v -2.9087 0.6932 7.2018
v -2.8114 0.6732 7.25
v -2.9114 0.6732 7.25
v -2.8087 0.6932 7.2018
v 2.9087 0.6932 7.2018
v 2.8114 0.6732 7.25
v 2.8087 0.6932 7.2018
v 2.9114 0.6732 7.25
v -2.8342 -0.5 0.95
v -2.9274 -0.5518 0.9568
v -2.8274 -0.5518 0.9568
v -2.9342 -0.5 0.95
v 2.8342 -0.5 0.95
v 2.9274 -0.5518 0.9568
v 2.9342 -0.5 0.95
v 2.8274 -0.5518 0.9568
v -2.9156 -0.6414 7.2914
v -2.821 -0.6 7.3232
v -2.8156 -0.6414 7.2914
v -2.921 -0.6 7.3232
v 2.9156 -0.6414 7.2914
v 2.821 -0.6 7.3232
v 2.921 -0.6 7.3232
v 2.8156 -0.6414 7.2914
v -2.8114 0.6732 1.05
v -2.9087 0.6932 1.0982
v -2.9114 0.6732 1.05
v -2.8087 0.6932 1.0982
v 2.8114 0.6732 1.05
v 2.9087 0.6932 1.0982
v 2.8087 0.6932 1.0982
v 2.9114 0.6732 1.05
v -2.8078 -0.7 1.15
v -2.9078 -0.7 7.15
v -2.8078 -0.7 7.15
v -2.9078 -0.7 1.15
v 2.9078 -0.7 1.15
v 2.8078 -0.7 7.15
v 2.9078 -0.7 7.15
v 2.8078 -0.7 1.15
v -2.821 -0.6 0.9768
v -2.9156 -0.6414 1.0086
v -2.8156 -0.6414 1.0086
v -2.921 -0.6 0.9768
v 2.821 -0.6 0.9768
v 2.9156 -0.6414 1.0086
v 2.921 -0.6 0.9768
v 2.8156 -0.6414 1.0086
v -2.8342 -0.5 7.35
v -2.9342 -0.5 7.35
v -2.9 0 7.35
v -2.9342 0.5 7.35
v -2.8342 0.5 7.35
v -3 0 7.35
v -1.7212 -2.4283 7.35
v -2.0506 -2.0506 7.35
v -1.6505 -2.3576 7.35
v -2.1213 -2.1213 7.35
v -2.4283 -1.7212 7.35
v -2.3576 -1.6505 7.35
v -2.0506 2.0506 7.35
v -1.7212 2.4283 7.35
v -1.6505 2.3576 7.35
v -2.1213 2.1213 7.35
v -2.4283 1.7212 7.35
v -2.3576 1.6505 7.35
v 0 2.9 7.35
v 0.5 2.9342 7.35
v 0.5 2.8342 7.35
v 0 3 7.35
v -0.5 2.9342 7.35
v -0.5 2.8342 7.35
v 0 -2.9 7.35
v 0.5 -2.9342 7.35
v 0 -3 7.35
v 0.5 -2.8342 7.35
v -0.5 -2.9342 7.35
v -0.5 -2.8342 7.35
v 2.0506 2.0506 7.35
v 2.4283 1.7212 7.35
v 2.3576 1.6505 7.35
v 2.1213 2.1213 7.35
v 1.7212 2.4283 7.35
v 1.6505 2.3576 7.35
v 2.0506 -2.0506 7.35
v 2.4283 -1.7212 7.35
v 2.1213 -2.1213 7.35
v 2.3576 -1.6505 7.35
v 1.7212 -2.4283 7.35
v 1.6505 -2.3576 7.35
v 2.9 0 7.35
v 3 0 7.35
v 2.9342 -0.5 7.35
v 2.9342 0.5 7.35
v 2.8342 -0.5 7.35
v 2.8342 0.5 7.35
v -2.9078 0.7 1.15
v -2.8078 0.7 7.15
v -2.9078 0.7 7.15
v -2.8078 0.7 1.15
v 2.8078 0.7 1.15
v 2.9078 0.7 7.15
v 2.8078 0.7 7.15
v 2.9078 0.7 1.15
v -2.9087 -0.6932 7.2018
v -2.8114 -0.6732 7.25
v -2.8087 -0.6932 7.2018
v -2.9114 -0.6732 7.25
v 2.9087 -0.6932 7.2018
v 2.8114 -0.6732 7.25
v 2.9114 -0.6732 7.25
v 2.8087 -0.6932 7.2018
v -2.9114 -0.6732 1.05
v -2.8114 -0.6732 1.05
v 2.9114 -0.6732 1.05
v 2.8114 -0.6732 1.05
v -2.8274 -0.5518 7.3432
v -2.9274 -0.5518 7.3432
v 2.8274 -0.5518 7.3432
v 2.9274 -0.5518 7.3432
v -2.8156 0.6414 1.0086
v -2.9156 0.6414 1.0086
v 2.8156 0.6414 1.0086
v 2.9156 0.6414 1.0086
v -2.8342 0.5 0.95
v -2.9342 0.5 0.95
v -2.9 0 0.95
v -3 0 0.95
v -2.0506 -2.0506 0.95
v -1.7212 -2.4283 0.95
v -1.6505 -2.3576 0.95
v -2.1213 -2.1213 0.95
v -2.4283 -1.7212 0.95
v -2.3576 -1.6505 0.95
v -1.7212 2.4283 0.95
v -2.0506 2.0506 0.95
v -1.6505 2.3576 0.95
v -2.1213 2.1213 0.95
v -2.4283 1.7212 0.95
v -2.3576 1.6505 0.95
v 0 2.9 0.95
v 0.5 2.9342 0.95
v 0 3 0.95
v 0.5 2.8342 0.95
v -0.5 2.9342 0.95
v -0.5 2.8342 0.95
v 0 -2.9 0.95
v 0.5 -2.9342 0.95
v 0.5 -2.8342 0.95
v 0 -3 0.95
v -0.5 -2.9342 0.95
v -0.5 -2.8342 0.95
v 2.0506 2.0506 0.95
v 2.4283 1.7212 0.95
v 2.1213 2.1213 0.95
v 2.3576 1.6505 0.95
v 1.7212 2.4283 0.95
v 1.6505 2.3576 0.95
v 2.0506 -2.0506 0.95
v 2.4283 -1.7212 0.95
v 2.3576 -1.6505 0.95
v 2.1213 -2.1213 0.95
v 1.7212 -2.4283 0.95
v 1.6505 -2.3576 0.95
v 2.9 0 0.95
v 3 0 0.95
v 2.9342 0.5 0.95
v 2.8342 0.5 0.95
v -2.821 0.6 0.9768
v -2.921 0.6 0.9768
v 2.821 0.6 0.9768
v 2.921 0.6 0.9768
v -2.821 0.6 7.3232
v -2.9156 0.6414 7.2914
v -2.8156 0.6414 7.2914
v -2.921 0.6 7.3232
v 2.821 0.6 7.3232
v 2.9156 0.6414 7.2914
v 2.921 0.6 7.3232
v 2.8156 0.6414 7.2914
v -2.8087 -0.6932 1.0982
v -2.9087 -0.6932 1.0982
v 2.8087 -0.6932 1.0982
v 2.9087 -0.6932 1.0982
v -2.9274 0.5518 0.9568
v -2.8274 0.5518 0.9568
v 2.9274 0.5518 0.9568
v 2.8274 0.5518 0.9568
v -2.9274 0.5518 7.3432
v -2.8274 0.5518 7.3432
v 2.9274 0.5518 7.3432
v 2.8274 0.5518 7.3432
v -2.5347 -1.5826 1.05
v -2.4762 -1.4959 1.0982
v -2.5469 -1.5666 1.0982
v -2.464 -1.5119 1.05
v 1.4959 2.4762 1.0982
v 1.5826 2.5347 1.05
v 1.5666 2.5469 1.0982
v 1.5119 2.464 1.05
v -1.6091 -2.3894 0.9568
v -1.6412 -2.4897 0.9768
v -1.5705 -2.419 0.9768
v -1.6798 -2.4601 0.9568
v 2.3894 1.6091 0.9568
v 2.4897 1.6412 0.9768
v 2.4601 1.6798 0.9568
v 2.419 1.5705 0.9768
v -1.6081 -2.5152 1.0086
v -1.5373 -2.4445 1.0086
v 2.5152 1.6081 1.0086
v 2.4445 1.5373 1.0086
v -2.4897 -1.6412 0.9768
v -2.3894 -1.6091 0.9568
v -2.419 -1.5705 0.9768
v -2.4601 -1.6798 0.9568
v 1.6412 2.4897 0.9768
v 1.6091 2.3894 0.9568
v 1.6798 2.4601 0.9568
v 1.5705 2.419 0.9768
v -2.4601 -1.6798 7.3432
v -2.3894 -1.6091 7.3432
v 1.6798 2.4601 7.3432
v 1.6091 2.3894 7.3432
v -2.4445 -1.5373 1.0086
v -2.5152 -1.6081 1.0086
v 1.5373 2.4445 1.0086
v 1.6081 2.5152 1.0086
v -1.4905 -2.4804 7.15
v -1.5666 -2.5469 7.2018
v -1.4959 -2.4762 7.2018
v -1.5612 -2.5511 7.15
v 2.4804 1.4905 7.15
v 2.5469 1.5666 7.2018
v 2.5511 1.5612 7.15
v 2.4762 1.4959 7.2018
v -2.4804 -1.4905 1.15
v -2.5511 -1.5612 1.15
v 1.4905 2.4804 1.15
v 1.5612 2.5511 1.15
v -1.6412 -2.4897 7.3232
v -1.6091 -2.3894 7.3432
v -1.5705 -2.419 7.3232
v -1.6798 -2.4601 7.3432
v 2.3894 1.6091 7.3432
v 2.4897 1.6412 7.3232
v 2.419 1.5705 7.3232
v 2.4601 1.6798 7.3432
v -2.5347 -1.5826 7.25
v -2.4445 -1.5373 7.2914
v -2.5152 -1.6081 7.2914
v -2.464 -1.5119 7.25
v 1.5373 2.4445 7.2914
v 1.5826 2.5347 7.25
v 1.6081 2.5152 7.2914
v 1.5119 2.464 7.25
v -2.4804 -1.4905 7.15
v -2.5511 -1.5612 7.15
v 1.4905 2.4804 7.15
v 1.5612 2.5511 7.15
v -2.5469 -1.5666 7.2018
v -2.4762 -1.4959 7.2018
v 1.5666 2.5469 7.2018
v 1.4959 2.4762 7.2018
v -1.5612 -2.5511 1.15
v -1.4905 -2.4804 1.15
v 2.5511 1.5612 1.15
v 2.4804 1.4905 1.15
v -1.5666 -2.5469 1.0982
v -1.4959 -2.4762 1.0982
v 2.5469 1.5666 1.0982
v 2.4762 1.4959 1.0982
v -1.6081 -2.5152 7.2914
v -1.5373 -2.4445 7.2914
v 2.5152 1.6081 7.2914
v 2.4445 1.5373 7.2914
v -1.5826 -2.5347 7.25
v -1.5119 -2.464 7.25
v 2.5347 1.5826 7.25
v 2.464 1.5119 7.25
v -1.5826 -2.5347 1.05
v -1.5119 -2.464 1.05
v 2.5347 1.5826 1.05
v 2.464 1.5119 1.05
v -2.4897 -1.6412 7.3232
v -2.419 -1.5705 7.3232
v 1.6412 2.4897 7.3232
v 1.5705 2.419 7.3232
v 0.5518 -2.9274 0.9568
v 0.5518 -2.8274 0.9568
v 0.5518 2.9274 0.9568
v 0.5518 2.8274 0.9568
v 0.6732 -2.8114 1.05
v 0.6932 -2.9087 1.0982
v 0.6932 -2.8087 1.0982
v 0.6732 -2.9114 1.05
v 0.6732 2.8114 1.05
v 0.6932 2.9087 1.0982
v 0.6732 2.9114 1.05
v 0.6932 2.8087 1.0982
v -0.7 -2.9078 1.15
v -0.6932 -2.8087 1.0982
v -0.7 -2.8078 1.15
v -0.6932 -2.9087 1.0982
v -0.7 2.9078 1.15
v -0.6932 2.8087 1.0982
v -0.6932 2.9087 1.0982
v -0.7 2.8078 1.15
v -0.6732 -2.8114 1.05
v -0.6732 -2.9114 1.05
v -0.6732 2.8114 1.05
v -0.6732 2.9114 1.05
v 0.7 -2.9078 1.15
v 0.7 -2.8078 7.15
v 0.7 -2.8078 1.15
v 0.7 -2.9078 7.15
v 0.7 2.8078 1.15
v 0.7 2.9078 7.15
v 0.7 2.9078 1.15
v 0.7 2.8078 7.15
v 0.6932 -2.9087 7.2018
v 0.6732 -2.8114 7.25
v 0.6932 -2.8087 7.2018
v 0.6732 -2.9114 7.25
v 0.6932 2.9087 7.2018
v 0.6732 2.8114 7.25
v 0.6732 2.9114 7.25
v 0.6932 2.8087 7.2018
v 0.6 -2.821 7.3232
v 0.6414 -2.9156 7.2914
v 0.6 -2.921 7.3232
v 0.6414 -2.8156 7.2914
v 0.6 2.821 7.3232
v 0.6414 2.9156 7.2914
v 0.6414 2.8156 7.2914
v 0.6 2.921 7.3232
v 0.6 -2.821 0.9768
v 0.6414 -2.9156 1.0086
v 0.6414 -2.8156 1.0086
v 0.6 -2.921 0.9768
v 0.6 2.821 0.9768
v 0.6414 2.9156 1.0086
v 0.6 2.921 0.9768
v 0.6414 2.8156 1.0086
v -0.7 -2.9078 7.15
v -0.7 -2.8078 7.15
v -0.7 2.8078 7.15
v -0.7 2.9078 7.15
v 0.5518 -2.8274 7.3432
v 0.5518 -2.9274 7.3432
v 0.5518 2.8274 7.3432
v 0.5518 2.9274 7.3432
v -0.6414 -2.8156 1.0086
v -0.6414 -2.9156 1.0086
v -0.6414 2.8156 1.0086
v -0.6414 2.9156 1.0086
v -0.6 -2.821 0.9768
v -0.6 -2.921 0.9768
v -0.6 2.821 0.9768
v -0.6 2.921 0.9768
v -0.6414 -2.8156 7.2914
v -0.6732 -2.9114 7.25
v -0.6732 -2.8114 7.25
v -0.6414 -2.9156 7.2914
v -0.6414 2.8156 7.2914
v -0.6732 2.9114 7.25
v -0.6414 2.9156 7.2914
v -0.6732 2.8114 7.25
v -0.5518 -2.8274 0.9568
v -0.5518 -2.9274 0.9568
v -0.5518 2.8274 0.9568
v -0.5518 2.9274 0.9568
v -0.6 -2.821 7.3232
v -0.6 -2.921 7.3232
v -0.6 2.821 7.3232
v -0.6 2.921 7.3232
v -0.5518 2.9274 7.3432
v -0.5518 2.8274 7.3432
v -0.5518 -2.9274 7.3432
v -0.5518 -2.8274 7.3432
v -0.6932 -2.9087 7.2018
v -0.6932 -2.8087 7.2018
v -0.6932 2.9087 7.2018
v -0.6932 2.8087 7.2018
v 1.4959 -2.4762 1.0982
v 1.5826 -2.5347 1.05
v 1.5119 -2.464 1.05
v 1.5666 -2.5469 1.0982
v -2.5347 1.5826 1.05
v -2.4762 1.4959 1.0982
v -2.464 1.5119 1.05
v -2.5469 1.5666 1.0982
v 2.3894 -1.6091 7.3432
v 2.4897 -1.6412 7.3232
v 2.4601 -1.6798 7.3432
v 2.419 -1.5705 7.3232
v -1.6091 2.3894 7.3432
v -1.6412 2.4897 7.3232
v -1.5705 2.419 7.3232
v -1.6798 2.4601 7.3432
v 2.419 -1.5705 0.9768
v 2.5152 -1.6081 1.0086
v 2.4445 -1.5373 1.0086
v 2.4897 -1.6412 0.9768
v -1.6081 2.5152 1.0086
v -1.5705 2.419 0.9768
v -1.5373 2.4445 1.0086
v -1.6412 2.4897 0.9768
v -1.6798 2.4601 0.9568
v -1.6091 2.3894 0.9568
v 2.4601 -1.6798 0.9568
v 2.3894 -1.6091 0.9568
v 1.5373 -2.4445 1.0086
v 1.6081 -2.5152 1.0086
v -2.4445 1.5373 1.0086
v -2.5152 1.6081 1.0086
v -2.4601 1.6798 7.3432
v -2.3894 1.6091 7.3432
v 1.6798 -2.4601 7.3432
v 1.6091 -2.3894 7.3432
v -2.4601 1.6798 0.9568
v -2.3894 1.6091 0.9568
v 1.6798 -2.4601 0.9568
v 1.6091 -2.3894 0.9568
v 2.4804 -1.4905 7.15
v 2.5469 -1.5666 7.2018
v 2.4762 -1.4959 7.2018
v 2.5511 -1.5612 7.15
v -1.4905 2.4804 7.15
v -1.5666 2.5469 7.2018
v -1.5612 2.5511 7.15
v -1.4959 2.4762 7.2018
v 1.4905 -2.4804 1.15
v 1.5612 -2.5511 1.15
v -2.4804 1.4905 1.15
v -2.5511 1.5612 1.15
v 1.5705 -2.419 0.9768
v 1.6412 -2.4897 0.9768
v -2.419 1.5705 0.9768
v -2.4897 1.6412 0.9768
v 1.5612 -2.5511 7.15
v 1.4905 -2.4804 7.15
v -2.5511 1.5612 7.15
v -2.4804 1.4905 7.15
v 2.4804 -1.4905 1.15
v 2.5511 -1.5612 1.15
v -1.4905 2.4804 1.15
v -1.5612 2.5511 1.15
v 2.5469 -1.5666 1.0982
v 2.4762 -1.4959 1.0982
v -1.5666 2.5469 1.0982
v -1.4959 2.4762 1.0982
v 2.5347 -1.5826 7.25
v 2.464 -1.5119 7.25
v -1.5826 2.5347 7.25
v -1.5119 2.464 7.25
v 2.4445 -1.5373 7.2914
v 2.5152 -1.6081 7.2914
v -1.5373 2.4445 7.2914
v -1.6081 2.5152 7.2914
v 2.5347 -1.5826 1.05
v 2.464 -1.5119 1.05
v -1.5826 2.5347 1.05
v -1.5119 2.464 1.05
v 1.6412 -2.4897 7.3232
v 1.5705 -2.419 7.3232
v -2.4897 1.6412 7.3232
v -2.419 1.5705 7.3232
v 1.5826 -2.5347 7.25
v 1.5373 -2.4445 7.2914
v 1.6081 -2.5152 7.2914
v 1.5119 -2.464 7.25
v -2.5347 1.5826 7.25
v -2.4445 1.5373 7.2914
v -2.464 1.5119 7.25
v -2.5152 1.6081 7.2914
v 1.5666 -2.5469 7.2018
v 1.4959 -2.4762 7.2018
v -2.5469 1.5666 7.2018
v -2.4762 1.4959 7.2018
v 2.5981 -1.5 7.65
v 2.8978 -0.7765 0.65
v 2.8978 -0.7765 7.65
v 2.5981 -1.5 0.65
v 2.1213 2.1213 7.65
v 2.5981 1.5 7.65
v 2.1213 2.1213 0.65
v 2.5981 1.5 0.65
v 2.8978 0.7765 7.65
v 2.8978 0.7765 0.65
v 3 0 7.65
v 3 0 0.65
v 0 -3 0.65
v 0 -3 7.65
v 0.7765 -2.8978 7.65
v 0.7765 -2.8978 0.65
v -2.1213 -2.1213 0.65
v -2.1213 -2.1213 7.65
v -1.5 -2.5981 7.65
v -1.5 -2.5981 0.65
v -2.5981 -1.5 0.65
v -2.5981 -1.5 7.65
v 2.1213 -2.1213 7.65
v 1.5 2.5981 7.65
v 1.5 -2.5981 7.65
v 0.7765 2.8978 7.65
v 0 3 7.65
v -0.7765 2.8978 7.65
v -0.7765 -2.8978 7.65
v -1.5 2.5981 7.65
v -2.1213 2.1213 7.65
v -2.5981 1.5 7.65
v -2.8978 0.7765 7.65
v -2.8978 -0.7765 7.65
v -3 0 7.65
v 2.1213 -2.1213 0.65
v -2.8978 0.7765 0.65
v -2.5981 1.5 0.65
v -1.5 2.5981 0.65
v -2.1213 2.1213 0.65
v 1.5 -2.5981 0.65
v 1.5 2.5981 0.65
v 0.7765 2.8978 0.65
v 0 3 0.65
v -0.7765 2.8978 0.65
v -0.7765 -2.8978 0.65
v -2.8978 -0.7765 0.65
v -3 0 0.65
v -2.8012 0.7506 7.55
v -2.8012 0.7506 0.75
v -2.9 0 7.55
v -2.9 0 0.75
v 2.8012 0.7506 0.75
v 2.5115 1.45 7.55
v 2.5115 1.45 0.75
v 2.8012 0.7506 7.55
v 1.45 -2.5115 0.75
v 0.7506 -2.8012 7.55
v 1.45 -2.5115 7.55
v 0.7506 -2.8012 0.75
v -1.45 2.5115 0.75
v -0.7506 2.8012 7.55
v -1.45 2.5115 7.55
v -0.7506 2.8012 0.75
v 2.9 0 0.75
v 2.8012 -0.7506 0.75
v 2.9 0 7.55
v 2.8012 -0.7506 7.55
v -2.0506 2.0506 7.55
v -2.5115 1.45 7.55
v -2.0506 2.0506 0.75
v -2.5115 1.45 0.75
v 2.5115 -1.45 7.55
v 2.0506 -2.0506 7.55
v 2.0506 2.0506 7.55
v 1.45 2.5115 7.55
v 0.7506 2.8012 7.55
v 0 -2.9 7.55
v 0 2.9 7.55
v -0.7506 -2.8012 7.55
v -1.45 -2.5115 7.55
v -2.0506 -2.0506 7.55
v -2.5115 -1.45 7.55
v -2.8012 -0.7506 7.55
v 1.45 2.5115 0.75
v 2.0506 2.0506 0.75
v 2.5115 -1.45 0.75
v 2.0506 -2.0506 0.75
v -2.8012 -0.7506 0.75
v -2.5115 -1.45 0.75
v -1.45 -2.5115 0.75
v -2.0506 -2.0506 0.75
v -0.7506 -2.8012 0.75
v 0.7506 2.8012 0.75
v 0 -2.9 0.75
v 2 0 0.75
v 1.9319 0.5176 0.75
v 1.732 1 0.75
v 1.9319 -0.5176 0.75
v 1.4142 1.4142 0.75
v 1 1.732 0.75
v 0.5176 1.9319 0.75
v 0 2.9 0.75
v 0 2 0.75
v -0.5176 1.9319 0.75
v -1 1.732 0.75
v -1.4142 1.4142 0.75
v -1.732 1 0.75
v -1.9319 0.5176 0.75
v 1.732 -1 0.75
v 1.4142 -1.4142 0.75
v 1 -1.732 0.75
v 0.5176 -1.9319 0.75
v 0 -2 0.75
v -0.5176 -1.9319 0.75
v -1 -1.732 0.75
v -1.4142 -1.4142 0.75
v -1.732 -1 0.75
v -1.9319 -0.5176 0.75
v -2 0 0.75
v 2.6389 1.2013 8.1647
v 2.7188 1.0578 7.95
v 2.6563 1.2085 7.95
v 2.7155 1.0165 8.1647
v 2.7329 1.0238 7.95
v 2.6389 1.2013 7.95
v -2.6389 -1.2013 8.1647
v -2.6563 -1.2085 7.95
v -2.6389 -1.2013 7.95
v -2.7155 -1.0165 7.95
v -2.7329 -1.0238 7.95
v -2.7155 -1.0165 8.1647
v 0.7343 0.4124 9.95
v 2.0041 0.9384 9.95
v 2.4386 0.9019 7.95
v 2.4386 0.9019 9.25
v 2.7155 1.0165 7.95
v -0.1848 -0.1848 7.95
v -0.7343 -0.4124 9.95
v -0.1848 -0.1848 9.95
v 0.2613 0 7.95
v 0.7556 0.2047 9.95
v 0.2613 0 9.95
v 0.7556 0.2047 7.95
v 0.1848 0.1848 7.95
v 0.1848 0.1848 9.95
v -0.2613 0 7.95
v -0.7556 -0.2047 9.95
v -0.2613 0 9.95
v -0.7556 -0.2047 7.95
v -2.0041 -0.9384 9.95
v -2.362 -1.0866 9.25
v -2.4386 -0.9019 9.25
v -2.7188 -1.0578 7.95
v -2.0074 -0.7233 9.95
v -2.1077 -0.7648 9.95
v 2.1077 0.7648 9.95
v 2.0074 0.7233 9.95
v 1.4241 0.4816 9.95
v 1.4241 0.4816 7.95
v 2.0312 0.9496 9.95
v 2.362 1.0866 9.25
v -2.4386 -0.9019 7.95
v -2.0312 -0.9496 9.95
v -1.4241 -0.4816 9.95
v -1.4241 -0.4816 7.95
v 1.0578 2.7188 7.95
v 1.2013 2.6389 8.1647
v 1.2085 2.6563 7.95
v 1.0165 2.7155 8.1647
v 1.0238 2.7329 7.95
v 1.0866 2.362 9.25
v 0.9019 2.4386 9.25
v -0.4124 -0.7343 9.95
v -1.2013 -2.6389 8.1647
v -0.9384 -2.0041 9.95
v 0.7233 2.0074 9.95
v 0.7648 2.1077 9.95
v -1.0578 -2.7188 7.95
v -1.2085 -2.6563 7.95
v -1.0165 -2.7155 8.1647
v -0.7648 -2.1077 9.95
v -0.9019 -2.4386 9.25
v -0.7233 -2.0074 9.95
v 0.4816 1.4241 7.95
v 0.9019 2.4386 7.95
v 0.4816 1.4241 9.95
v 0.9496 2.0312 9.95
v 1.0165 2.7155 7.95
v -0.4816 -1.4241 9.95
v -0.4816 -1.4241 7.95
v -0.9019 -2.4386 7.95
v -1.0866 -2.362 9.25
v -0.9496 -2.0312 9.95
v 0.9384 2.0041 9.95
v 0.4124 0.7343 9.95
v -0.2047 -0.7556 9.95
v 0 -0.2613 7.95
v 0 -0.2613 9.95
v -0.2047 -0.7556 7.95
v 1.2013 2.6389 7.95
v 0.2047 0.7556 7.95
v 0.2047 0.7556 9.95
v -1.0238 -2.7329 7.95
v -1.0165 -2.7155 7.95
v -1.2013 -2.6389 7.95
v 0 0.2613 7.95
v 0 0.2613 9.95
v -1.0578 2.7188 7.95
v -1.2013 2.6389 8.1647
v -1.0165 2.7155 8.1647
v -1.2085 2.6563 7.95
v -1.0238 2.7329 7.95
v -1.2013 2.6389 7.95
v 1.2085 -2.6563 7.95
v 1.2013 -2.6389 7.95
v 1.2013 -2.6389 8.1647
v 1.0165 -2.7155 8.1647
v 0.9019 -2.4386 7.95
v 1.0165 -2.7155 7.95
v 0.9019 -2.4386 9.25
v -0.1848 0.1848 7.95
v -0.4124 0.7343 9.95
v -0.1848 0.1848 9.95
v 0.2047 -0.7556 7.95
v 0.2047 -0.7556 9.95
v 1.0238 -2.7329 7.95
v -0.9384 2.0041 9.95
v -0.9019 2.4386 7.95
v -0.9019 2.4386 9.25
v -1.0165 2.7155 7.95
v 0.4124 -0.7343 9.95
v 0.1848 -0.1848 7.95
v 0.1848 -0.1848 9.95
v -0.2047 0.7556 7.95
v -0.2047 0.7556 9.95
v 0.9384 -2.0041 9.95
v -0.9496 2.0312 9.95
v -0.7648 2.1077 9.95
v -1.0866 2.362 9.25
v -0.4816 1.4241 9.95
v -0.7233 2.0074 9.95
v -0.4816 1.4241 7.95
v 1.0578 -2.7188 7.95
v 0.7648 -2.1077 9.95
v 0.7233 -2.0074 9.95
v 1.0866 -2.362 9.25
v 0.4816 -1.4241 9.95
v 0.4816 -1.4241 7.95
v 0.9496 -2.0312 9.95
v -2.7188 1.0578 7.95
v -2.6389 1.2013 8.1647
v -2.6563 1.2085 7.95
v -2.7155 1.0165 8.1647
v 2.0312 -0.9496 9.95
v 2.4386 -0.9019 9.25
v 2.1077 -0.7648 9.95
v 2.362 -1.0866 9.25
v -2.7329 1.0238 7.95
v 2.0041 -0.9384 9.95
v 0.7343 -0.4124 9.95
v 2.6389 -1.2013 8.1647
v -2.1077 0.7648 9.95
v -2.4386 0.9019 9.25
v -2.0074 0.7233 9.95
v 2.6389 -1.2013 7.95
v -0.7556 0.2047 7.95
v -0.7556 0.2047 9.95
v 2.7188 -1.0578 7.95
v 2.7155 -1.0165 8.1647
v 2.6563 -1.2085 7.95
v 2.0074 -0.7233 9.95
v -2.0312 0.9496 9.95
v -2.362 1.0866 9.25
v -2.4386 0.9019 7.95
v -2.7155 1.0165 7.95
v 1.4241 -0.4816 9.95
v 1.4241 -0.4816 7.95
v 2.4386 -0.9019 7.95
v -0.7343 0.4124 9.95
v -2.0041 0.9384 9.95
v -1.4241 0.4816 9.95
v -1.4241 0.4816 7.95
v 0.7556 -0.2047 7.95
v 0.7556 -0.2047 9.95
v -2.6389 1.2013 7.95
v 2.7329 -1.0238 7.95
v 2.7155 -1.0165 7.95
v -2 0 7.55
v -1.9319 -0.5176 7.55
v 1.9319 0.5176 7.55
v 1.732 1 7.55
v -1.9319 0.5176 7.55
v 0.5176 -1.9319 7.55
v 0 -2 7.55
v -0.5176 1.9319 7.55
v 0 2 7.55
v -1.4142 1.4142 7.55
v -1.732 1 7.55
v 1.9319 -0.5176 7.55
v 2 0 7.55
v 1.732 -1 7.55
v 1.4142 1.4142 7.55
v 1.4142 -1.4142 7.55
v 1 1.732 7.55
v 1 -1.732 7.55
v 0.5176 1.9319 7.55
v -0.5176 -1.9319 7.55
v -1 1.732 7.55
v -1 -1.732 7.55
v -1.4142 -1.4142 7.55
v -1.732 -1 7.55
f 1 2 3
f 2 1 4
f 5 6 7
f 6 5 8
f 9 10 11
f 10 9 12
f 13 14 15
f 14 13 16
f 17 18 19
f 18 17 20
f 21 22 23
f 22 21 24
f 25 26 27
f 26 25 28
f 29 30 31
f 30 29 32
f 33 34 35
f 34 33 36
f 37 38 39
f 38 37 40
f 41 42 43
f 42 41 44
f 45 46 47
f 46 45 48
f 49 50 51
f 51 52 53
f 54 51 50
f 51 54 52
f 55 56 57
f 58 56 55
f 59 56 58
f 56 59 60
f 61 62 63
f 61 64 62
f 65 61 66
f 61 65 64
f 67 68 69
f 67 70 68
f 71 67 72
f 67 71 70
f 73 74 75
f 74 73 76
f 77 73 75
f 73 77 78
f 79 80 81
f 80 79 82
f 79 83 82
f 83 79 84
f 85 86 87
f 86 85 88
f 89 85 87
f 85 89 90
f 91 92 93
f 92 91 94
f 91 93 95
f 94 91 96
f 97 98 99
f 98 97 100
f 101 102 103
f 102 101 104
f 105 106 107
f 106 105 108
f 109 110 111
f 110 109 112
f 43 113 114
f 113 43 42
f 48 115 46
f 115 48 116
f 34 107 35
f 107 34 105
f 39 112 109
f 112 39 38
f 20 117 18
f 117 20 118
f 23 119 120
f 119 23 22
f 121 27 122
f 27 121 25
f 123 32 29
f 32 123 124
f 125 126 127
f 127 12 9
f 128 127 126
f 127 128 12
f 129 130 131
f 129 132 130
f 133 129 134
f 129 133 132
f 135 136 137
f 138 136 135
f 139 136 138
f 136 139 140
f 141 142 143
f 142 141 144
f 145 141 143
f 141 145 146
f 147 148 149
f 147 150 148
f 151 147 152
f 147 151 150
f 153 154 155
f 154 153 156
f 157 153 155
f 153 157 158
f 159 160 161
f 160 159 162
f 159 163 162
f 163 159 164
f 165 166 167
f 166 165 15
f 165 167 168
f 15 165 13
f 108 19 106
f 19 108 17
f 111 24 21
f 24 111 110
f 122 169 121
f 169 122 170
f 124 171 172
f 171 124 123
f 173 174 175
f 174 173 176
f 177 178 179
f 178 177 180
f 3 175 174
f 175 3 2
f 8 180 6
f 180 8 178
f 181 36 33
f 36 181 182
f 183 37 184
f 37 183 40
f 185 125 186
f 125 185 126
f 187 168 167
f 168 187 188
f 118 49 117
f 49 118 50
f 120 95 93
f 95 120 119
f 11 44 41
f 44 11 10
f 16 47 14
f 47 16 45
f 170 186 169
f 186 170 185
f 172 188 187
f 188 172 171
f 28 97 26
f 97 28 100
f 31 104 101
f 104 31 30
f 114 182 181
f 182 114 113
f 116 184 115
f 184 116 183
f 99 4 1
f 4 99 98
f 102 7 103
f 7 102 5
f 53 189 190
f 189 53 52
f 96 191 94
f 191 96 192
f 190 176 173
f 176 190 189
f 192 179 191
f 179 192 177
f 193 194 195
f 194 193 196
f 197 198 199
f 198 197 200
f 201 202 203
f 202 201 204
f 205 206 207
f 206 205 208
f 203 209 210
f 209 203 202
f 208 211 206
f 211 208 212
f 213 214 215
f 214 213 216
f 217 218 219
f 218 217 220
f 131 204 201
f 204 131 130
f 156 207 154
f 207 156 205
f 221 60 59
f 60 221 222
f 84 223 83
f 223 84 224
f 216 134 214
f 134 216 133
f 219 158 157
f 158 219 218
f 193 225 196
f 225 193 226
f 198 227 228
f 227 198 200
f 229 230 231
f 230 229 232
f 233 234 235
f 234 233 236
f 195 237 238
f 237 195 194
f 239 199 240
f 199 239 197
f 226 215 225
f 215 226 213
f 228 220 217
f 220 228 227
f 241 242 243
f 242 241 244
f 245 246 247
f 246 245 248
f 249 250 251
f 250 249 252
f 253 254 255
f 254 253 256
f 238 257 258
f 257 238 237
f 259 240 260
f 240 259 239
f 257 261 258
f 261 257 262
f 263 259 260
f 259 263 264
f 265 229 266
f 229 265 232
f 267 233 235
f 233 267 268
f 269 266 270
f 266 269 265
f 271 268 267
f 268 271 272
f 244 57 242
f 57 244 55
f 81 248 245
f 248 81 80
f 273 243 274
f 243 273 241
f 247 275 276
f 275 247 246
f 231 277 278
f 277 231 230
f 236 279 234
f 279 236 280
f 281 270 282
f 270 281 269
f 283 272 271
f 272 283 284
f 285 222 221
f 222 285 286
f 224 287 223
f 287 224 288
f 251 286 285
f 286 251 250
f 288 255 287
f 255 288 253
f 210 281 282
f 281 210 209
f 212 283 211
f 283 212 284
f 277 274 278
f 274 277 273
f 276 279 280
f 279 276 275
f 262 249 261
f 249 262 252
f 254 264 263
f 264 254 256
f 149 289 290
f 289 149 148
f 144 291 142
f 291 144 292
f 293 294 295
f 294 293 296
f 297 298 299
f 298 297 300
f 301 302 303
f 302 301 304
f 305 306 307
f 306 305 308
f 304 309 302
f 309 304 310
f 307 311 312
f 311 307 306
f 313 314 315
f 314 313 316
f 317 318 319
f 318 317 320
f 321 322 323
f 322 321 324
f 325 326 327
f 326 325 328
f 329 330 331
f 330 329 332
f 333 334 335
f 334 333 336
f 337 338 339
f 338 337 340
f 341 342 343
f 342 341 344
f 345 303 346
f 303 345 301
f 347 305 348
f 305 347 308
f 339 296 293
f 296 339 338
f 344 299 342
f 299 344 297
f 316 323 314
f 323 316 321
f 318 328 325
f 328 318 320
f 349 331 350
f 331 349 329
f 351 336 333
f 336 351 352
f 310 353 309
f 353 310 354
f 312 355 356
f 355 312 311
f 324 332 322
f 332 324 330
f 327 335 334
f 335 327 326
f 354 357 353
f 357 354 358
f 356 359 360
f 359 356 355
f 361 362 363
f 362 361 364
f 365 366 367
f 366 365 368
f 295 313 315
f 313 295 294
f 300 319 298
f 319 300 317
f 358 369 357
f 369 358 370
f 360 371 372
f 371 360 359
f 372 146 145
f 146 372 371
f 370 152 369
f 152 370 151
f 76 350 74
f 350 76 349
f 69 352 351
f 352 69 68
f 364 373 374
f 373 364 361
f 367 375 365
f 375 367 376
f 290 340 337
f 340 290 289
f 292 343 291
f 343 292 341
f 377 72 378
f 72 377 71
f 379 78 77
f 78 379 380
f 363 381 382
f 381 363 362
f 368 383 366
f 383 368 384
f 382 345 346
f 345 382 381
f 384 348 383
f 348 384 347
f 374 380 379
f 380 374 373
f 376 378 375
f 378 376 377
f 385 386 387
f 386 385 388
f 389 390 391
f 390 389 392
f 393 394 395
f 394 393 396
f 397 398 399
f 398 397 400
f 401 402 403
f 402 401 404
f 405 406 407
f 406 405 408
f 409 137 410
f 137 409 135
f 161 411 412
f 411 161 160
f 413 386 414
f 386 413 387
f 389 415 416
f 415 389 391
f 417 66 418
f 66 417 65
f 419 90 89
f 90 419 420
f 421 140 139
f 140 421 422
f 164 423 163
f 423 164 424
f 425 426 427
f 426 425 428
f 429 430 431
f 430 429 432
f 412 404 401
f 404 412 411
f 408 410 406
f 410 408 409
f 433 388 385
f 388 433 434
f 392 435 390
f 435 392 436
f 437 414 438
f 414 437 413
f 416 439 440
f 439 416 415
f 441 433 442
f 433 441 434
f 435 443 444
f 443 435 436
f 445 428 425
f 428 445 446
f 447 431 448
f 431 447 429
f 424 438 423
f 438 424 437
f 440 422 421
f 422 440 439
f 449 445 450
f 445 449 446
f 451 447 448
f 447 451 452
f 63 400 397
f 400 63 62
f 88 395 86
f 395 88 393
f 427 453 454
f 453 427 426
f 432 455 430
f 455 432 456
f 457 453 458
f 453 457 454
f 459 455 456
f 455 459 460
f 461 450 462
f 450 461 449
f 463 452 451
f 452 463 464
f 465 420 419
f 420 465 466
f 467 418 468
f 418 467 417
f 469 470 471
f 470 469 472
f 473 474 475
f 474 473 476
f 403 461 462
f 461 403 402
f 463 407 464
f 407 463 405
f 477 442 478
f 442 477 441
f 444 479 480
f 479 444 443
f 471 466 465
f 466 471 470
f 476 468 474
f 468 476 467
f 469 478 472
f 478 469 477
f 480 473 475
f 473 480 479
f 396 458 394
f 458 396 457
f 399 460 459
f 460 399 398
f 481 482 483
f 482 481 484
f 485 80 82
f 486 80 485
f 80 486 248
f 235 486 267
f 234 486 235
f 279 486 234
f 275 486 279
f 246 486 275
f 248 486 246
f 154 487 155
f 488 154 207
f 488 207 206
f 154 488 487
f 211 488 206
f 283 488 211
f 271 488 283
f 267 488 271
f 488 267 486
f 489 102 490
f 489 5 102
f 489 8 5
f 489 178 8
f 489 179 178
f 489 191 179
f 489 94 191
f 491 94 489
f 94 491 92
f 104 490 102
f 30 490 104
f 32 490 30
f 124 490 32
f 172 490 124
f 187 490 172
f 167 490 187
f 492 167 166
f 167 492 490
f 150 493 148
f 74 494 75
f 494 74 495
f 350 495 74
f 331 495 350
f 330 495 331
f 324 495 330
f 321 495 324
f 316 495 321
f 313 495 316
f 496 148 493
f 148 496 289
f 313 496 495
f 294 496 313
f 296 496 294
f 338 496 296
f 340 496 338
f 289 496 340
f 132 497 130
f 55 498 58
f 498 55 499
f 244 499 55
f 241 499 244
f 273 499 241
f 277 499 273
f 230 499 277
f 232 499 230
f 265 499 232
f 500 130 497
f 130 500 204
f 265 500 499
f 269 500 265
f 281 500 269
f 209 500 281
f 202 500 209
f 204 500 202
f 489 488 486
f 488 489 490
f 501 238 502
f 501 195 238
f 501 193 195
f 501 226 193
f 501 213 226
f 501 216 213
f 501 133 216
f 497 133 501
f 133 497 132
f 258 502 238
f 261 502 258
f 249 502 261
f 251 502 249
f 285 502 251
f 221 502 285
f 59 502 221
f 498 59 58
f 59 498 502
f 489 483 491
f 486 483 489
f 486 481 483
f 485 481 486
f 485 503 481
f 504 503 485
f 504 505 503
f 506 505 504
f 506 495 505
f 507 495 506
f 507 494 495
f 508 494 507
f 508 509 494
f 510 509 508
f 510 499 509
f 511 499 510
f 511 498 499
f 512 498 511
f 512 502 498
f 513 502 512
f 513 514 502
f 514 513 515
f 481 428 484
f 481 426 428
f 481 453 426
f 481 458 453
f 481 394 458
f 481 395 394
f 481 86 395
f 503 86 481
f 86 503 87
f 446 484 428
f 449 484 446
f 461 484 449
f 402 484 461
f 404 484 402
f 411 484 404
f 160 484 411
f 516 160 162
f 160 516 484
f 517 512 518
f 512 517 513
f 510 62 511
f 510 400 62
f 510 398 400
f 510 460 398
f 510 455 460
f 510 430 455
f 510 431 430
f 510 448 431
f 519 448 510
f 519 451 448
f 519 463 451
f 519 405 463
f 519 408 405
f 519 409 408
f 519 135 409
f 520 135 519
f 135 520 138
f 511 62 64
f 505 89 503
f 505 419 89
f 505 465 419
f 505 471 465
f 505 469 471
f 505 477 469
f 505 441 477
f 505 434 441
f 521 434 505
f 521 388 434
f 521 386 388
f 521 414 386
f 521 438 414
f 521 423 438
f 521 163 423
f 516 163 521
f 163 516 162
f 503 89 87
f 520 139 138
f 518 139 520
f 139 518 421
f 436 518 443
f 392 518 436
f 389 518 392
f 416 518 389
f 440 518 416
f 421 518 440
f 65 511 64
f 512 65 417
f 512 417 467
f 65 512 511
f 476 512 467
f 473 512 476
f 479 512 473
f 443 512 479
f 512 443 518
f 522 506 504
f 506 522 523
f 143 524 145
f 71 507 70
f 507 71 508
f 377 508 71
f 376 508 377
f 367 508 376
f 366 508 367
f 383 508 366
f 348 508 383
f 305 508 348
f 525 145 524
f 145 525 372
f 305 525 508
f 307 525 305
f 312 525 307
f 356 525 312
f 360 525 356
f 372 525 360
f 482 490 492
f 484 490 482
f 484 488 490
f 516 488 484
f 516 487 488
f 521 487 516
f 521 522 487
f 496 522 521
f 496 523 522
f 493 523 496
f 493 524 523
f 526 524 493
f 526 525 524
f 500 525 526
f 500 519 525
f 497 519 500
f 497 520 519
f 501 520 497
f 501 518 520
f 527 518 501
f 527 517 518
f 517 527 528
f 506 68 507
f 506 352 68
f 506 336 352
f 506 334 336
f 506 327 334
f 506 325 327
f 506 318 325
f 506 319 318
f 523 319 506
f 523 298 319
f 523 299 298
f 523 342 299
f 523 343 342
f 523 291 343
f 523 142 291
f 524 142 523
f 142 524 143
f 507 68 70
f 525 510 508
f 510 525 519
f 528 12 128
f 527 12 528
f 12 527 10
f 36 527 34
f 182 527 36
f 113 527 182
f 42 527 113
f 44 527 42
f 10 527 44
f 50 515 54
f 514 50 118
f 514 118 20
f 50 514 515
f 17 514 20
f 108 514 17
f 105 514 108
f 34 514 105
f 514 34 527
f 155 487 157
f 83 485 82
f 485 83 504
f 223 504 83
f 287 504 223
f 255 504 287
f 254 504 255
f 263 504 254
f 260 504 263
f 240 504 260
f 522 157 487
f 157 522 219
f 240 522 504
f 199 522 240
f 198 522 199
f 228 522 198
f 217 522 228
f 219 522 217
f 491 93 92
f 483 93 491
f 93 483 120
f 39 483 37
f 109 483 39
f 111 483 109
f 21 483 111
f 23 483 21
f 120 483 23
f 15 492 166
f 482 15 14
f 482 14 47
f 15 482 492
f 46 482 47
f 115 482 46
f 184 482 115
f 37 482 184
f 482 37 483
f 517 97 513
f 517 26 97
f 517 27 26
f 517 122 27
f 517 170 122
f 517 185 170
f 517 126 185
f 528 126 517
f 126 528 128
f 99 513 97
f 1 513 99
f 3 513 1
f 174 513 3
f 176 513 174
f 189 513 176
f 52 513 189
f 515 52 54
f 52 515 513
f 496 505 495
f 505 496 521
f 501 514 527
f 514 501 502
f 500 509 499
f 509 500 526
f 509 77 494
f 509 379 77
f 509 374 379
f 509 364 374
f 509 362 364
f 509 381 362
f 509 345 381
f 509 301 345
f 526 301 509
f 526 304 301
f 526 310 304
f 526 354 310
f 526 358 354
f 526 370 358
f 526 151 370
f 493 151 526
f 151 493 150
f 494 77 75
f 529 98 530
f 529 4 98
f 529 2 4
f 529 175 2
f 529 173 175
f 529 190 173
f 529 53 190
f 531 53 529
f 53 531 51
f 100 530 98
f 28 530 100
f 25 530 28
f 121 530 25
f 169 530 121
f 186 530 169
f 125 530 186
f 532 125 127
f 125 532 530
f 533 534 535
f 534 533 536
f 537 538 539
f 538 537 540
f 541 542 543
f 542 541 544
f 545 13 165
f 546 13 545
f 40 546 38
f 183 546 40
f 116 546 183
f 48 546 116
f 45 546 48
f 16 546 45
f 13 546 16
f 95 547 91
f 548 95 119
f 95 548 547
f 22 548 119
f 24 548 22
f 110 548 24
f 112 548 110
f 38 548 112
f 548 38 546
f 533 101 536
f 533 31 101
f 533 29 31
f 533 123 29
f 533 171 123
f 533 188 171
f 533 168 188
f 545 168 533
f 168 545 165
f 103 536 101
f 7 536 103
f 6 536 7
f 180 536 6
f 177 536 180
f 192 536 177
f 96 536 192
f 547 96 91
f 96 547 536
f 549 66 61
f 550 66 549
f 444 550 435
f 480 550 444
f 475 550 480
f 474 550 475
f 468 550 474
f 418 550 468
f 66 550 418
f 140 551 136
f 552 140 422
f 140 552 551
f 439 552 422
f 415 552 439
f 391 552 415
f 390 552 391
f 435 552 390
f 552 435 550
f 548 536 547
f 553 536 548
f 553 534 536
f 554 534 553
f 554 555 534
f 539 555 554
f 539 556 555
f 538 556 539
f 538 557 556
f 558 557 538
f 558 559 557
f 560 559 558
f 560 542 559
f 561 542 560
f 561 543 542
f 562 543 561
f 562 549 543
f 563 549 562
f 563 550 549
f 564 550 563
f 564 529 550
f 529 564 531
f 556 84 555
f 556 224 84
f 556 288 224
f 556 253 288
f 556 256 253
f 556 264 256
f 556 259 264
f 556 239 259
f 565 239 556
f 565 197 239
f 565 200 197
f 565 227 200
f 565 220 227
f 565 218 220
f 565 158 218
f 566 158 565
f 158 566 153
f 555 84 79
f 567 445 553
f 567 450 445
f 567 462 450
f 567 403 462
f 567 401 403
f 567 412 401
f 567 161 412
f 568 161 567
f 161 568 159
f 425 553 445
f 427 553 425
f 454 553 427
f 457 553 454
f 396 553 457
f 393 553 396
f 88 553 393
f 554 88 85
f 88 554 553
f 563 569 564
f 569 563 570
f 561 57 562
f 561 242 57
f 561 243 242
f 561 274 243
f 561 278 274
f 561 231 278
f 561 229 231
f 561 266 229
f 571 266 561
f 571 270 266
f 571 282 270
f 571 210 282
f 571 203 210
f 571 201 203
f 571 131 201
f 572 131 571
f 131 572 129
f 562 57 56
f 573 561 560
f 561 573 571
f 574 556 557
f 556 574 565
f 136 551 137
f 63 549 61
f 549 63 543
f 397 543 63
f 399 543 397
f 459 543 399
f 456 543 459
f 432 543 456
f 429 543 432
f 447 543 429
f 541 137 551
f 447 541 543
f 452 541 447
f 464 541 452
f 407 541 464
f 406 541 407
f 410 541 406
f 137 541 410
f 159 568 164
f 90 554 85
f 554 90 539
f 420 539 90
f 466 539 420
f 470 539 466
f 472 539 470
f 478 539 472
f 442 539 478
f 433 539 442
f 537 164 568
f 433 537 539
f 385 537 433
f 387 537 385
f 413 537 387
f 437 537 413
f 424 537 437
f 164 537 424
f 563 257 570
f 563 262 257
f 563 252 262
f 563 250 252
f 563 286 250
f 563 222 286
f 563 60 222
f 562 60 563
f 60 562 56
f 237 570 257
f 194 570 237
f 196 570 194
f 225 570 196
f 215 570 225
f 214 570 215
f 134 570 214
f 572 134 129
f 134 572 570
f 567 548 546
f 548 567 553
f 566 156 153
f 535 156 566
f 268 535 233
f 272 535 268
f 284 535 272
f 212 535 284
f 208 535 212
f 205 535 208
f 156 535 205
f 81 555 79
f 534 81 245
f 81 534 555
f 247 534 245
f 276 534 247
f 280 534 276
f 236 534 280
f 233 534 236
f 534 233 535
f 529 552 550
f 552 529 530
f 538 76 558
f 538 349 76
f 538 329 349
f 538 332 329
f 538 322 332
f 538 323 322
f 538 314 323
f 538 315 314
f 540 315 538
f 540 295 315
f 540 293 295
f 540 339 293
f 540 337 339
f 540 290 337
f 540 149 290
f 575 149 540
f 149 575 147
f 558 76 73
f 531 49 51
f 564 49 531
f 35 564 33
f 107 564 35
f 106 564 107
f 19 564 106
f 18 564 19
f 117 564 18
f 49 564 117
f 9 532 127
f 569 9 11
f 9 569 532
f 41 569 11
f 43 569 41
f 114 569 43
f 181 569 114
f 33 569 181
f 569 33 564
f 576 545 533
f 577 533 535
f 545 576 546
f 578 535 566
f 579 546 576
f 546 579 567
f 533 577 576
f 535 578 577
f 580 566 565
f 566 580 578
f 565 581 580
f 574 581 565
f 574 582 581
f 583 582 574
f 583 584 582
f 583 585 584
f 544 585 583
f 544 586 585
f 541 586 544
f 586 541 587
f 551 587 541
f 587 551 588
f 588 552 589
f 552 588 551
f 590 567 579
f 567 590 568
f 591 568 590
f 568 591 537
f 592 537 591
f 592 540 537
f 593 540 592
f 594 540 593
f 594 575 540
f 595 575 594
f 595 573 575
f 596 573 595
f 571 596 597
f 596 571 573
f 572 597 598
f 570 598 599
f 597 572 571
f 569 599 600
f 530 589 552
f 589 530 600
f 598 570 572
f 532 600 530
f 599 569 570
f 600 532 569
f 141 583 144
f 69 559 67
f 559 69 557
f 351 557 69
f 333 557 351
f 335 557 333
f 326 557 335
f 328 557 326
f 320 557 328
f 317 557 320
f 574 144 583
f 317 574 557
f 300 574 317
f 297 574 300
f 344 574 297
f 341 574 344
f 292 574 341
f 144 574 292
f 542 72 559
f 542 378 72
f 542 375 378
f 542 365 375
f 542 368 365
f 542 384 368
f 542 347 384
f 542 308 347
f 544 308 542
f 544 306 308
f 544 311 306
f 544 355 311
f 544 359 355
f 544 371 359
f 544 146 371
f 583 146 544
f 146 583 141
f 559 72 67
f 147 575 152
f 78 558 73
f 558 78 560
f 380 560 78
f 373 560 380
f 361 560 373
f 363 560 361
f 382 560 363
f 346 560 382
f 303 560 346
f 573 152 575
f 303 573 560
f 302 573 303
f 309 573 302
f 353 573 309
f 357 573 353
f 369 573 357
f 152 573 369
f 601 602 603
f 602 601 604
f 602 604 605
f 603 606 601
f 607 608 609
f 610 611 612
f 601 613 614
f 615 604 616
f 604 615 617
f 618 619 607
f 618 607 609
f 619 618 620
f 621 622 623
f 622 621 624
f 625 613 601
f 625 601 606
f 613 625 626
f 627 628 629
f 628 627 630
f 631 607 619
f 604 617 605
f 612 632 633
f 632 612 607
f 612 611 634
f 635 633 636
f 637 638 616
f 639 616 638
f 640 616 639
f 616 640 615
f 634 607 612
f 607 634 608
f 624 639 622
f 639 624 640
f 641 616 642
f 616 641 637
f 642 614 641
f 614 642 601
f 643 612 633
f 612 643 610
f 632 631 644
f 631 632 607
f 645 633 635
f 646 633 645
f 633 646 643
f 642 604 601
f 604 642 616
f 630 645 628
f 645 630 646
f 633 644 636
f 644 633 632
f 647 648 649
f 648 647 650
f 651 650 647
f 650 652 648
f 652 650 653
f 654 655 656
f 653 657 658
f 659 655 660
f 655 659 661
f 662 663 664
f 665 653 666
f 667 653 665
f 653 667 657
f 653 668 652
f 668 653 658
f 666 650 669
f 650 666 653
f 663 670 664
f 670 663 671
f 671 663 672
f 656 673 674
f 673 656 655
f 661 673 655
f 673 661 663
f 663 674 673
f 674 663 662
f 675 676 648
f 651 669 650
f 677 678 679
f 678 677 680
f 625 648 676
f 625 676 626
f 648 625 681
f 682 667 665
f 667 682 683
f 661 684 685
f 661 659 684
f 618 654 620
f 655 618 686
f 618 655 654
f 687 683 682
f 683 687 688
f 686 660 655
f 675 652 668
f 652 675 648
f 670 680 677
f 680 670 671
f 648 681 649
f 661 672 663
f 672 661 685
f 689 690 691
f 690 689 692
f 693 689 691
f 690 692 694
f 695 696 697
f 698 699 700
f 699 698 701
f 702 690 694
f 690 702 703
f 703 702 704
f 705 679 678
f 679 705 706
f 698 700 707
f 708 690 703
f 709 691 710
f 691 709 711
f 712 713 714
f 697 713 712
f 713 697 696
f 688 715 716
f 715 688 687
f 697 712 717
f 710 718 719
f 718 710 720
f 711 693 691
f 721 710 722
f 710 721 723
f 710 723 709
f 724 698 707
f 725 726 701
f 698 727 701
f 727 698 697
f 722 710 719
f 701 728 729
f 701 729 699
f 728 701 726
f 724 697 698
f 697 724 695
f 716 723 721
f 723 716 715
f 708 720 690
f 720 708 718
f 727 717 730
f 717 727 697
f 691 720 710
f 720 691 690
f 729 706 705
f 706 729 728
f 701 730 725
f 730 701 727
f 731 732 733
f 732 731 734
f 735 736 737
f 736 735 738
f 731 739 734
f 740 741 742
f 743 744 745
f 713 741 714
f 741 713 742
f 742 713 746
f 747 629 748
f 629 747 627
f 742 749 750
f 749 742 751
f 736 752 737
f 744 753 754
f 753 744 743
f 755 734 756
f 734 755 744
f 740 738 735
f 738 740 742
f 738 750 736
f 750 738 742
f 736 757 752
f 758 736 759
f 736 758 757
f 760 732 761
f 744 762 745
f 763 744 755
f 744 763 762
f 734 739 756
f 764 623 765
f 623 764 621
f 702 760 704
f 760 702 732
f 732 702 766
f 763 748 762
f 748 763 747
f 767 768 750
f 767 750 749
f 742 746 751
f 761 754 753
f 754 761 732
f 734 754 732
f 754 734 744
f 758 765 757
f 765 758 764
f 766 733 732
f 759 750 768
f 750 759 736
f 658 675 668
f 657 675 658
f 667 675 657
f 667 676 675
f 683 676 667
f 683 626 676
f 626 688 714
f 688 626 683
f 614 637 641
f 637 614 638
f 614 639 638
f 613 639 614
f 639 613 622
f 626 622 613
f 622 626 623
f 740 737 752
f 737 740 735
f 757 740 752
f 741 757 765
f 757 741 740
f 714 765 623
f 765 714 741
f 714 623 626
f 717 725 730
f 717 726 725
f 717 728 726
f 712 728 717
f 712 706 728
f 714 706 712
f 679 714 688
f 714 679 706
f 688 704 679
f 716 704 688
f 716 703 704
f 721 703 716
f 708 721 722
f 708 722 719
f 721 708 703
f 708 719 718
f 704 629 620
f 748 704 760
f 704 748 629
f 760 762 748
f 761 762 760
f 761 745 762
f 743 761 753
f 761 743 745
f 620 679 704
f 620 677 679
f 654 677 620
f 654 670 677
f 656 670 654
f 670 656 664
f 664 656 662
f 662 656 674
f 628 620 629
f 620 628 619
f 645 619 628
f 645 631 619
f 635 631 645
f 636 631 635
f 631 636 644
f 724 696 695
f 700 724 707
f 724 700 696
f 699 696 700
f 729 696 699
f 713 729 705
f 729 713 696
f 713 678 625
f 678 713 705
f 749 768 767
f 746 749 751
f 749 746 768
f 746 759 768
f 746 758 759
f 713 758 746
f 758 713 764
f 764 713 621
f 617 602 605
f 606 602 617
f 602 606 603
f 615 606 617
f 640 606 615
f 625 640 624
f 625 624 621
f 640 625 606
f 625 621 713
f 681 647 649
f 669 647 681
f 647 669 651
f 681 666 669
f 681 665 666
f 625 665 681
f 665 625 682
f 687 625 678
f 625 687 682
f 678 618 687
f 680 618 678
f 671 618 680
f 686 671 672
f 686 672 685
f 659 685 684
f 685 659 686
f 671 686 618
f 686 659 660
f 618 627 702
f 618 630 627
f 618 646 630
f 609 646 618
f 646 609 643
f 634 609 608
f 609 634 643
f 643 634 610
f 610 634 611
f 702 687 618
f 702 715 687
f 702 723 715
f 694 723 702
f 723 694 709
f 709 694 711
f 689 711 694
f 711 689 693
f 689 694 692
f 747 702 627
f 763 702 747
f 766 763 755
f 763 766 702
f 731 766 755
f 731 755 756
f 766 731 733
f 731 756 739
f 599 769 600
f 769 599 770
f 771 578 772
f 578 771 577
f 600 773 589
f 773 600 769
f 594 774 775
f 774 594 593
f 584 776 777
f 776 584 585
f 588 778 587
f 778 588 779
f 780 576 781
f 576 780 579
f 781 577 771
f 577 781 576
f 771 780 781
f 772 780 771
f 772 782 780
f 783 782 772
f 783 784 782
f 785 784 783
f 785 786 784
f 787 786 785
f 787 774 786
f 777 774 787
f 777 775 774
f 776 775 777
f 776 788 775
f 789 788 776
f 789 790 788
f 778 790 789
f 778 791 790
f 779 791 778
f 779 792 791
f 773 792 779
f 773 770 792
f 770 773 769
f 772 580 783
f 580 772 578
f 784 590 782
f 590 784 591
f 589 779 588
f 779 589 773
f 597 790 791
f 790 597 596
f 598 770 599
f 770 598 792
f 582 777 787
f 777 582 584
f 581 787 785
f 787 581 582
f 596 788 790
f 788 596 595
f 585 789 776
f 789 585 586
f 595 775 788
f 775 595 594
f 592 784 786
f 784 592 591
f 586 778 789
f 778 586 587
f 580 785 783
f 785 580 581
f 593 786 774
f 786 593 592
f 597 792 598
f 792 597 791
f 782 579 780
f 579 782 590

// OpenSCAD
use <lib.scad>

hd = 24;

module smrCapHD($fn=hd) {
	translate([0,0,7.8]) intersection() {
		union() {
			hull() {
				cyl(3,3,0.5);
				translate([0,0,0.5]) cyl(2.6,2.6,0.5);
			}
			hull() {
				translate([0,0,3]) cyl(1,1,0.1);
				cyl(2.25,2.25,3.25);
			}
		}
		translate([0,0,1.1]) box([10,10,2.2]);
	}
}

module smrFinsHD($fn=hd) {
	union() {
		difference() {
			for (i = [0:45:360]) rotate([0,0,i+22.5]) hull() {
				translate([5,0,2]) rotate([90,0,0]) cyl(1,1,0.1);
				translate([5,0,6.5]) rotate([90,0,0]) cyl(1,1,0.1);
				translate([0,0,4.25]) box([1,0.1,6.5]);
			}
			translate([0,0,2.5]) difference() { cyl(10,10,0.1); cyl(4,4,0.2); }
			translate([0,0,4.25]) difference() { cyl(10,10,0.1); cyl(4,4,0.2); }
			translate([0,0,6]) difference() { cyl(10,10,0.1); cyl(4,4,0.2); }
			translate([0,0,4]) cyl(3,3,8);
			translate([0,0,7.5]) hull() {
				translate([0,0,2.5]) cyl(5,5,1);
				translate([0,0,-2.5]) cyl(1,1,1);
			}
		}
	}
}

module smrBodyHD($fn=hd) {
	union() {
		translate([0,0,4.15]) difference() {
			cyl(3,3,7);
			cyl(2.9,2.9,6.8);
			for (i = [0:45:180]) hull() {
				rotate([0,0,i]) translate([3,0,0]) hull() {
					translate([0,0.5,-3]) rotate([0,90,0]) cyl(0.2,0.2,0.1);
					translate([0,-0.5,-3]) rotate([0,90,0]) cyl(0.2,0.2,0.1);
					translate([0,0.5,3]) rotate([0,90,0]) cyl(0.2,0.2,0.1);
					translate([0,-0.5,3]) rotate([0,90,0]) cyl(0.2,0.2,0.1);
				}
				rotate([0,0,i+180]) translate([3,0,0]) hull() {
					translate([0,0.5,-3]) rotate([0,90,0]) cyl(0.2,0.2,0.1);
					translate([0,-0.5,-3]) rotate([0,90,0]) cyl(0.2,0.2,0.1);
					translate([0,0.5,3]) rotate([0,90,0]) cyl(0.2,0.2,0.1);
					translate([0,-0.5,3]) rotate([0,90,0]) cyl(0.2,0.2,0.1);
				}
			}
		}
		translate([0,0,4.15]) cyl(2,2,6.8);

		intersection() {
			translate([0,0,7]) for (i = [0:45:360])
				rotate([0,0,i+22.5]) rotate([90,0,0]) scale([1,1.5,1]) cyl(3,3,0.2);
			translate([0,0,8.95]) box([10,10,2]);
		}
	}
}

module smrBaseHD($fn=hd) {
	translate([0,0,0.35]) cyl(4,4,0.7);
}

module smrSpinnerHD($fn=hd) {
	translate([0,0,4.15]) union() {
		box([5.5,1,6]);
		rotate([0,0,45]) box([5.5,1,6]);
		rotate([0,0,90]) box([5.5,1,6]);
		rotate([0,0,135]) box([5.5,1,6]);
	}
}

module smrPipesHD($fn=hd/2) {
	x = 3.5;
	z = 7.5;
	points = [
		[x,0,-1],
		[x,0,(z-0.2)],
		[(x-0.07),0,(z-0.07)],
		[(x-0.2),0,z],
		[-(x-0.2),0,z],
		[-(x-0.07),0,(z-0.07)],
		[-x,0,(z-0.2)],
		[-x,0,-1],
	];
	union() {
		rotate([0,0,0]) translate([0,0,1.5]) pipe(points, 0.3);
		rotate([0,0,90]) translate([0,0,1.5]) pipe(points, 0.3);
	}
}

//smrCapHD();
smrBodyHD();
//smrBaseHD();
//smrFinsHD();
//smrSpinnerHD();
//smrPipesHD();
